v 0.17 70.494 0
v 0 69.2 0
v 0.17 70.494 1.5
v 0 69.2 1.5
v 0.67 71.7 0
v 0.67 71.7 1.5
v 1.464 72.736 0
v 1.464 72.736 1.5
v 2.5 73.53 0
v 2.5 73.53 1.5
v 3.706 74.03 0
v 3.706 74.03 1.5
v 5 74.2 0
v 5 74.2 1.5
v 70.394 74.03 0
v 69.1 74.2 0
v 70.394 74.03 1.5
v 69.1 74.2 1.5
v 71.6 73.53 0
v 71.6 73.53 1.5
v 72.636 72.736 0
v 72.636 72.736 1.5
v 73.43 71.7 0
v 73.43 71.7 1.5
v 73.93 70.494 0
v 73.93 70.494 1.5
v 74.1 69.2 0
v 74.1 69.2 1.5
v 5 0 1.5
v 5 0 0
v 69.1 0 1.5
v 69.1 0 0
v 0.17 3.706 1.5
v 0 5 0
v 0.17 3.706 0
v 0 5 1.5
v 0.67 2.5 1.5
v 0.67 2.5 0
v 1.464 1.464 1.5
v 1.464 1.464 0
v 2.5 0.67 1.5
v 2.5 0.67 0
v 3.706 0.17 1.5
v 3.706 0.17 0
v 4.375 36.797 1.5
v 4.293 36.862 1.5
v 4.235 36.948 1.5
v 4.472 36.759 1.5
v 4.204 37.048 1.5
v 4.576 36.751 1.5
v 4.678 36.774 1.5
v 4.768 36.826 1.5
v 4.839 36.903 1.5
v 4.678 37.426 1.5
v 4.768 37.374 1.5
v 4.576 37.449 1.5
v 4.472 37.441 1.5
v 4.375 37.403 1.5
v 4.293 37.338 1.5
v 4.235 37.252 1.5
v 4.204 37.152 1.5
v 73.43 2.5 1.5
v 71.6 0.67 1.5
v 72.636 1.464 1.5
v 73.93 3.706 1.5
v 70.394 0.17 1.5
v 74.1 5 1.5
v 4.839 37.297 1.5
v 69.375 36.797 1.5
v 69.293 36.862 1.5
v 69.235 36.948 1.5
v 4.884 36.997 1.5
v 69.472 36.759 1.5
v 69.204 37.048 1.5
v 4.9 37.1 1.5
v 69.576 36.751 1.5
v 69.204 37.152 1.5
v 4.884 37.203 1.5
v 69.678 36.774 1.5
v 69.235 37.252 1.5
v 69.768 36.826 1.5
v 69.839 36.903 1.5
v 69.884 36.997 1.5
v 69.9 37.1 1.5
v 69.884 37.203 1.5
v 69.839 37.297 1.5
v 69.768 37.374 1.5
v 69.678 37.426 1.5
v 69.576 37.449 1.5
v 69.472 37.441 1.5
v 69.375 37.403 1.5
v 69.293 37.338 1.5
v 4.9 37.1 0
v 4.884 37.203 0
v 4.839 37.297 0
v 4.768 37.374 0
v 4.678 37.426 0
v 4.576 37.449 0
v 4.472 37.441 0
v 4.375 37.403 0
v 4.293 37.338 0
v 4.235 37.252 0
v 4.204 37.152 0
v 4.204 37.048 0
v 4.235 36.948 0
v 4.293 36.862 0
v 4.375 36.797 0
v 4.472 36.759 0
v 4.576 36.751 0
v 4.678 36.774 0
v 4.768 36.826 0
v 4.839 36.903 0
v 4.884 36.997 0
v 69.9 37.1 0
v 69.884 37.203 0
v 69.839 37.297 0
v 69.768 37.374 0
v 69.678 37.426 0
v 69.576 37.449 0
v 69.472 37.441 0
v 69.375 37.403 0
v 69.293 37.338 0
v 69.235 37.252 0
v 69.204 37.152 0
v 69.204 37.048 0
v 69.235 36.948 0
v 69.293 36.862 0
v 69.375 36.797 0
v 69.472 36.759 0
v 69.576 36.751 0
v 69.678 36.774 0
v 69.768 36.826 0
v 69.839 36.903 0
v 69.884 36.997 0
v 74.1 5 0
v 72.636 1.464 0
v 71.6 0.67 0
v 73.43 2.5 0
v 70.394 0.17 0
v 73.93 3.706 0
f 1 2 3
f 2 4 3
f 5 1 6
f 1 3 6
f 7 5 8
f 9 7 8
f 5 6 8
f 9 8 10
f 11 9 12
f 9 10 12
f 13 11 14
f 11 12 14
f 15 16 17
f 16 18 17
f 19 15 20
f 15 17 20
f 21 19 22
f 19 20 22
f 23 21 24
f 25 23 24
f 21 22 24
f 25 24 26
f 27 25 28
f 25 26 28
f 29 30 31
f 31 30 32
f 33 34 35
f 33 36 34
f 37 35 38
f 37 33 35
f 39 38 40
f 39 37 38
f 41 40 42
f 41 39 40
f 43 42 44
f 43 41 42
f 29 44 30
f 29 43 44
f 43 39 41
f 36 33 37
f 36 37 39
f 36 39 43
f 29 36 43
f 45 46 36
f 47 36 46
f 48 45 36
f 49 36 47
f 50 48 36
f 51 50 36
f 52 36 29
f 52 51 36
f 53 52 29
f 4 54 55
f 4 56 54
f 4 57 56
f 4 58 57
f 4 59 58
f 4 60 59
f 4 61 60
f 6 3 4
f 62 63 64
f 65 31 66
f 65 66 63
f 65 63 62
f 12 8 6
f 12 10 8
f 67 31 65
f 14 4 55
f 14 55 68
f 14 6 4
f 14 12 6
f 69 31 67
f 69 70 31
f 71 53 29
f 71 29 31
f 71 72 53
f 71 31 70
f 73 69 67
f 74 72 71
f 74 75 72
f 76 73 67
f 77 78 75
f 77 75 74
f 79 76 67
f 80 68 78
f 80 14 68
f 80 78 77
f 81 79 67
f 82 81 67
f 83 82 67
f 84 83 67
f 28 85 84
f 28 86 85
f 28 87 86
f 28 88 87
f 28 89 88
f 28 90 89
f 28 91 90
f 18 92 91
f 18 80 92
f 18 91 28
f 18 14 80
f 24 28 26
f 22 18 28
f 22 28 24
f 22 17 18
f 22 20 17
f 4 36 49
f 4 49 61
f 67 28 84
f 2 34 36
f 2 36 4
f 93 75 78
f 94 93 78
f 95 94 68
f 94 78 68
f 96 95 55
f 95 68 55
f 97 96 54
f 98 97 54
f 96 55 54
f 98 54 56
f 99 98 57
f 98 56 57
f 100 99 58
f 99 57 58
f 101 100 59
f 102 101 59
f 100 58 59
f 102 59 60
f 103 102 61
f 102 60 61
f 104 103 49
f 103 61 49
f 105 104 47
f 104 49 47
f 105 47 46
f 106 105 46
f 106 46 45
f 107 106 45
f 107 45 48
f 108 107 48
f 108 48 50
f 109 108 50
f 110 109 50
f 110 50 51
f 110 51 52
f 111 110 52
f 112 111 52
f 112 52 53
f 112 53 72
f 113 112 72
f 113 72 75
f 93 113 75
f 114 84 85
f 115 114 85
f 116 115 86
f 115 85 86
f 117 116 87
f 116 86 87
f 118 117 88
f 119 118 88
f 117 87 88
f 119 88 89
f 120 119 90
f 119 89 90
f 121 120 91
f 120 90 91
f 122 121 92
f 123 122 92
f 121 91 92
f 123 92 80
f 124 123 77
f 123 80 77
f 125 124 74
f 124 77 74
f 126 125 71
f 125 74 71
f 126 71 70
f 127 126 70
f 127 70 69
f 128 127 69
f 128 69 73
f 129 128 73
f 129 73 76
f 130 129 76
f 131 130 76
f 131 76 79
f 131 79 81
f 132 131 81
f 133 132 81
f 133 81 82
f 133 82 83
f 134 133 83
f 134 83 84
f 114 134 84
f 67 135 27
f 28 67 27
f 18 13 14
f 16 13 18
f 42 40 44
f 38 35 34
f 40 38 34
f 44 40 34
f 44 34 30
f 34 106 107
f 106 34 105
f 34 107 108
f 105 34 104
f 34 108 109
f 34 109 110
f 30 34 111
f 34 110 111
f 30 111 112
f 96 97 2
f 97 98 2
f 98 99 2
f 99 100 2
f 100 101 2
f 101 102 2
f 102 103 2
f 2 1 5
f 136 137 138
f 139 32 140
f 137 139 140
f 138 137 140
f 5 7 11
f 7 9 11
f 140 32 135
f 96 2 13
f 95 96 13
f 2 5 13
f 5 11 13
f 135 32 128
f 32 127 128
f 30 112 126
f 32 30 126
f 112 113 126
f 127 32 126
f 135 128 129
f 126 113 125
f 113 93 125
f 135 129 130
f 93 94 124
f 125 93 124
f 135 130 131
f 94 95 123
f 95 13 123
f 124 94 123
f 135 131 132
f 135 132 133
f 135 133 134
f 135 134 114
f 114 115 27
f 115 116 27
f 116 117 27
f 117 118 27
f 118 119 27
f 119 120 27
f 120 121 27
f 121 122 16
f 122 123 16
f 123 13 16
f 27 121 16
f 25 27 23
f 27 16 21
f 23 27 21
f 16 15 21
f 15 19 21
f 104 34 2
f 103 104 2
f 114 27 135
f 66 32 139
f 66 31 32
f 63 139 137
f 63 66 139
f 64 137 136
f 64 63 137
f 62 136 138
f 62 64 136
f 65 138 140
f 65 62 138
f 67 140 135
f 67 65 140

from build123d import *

# Parameters (mm, degrees)
F0_W     = 74.1
F0_H     = 74.2
F0_R     = 2.625
F1_DEPTH = 1.5
F2_R     = 0.35
F3_DEPTH = 1.501
F4_R     = 5


with BuildPart() as f1:
    # F0 (on Top) → F1 (new body)
    with BuildSketch(Plane.XY):
        with Locations((37.05, 37.1)):
            Rectangle(F0_W, F0_H)
        with Locations((4.55, 37.1)):
            Circle(F0_R, mode=Mode.SUBTRACT)
        with Locations((69.55, 37.1)):
            Circle(F0_R, mode=Mode.SUBTRACT)
        with Locations((4.55, 37.1)):
            Circle(F0_R)
        with Locations((69.55, 37.1)):
            Circle(F0_R)
    extrude(amount=F1_DEPTH)

    # F2 (on face) → F3 (cut, through all)
    with BuildSketch(Plane.XY.offset(1.5)):
        with Locations((4.55, 37.1)):
            Circle(F2_R)
        with Locations((69.55, 37.1)):
            Circle(F2_R)
    extrude(amount=-F3_DEPTH, mode=Mode.SUBTRACT)

    # F4
    f4_edges = [f1.edges().sort_by_distance(p)[0] for p in [
        (74.1, 74.2, 0.75),
        (0, 74.2, 0.75),
        (0, 0, 0.75),
        (74.1, 0, 0.75),
    ]]
    fillet(f4_edges, radius=F4_R)


solid = f1.part
